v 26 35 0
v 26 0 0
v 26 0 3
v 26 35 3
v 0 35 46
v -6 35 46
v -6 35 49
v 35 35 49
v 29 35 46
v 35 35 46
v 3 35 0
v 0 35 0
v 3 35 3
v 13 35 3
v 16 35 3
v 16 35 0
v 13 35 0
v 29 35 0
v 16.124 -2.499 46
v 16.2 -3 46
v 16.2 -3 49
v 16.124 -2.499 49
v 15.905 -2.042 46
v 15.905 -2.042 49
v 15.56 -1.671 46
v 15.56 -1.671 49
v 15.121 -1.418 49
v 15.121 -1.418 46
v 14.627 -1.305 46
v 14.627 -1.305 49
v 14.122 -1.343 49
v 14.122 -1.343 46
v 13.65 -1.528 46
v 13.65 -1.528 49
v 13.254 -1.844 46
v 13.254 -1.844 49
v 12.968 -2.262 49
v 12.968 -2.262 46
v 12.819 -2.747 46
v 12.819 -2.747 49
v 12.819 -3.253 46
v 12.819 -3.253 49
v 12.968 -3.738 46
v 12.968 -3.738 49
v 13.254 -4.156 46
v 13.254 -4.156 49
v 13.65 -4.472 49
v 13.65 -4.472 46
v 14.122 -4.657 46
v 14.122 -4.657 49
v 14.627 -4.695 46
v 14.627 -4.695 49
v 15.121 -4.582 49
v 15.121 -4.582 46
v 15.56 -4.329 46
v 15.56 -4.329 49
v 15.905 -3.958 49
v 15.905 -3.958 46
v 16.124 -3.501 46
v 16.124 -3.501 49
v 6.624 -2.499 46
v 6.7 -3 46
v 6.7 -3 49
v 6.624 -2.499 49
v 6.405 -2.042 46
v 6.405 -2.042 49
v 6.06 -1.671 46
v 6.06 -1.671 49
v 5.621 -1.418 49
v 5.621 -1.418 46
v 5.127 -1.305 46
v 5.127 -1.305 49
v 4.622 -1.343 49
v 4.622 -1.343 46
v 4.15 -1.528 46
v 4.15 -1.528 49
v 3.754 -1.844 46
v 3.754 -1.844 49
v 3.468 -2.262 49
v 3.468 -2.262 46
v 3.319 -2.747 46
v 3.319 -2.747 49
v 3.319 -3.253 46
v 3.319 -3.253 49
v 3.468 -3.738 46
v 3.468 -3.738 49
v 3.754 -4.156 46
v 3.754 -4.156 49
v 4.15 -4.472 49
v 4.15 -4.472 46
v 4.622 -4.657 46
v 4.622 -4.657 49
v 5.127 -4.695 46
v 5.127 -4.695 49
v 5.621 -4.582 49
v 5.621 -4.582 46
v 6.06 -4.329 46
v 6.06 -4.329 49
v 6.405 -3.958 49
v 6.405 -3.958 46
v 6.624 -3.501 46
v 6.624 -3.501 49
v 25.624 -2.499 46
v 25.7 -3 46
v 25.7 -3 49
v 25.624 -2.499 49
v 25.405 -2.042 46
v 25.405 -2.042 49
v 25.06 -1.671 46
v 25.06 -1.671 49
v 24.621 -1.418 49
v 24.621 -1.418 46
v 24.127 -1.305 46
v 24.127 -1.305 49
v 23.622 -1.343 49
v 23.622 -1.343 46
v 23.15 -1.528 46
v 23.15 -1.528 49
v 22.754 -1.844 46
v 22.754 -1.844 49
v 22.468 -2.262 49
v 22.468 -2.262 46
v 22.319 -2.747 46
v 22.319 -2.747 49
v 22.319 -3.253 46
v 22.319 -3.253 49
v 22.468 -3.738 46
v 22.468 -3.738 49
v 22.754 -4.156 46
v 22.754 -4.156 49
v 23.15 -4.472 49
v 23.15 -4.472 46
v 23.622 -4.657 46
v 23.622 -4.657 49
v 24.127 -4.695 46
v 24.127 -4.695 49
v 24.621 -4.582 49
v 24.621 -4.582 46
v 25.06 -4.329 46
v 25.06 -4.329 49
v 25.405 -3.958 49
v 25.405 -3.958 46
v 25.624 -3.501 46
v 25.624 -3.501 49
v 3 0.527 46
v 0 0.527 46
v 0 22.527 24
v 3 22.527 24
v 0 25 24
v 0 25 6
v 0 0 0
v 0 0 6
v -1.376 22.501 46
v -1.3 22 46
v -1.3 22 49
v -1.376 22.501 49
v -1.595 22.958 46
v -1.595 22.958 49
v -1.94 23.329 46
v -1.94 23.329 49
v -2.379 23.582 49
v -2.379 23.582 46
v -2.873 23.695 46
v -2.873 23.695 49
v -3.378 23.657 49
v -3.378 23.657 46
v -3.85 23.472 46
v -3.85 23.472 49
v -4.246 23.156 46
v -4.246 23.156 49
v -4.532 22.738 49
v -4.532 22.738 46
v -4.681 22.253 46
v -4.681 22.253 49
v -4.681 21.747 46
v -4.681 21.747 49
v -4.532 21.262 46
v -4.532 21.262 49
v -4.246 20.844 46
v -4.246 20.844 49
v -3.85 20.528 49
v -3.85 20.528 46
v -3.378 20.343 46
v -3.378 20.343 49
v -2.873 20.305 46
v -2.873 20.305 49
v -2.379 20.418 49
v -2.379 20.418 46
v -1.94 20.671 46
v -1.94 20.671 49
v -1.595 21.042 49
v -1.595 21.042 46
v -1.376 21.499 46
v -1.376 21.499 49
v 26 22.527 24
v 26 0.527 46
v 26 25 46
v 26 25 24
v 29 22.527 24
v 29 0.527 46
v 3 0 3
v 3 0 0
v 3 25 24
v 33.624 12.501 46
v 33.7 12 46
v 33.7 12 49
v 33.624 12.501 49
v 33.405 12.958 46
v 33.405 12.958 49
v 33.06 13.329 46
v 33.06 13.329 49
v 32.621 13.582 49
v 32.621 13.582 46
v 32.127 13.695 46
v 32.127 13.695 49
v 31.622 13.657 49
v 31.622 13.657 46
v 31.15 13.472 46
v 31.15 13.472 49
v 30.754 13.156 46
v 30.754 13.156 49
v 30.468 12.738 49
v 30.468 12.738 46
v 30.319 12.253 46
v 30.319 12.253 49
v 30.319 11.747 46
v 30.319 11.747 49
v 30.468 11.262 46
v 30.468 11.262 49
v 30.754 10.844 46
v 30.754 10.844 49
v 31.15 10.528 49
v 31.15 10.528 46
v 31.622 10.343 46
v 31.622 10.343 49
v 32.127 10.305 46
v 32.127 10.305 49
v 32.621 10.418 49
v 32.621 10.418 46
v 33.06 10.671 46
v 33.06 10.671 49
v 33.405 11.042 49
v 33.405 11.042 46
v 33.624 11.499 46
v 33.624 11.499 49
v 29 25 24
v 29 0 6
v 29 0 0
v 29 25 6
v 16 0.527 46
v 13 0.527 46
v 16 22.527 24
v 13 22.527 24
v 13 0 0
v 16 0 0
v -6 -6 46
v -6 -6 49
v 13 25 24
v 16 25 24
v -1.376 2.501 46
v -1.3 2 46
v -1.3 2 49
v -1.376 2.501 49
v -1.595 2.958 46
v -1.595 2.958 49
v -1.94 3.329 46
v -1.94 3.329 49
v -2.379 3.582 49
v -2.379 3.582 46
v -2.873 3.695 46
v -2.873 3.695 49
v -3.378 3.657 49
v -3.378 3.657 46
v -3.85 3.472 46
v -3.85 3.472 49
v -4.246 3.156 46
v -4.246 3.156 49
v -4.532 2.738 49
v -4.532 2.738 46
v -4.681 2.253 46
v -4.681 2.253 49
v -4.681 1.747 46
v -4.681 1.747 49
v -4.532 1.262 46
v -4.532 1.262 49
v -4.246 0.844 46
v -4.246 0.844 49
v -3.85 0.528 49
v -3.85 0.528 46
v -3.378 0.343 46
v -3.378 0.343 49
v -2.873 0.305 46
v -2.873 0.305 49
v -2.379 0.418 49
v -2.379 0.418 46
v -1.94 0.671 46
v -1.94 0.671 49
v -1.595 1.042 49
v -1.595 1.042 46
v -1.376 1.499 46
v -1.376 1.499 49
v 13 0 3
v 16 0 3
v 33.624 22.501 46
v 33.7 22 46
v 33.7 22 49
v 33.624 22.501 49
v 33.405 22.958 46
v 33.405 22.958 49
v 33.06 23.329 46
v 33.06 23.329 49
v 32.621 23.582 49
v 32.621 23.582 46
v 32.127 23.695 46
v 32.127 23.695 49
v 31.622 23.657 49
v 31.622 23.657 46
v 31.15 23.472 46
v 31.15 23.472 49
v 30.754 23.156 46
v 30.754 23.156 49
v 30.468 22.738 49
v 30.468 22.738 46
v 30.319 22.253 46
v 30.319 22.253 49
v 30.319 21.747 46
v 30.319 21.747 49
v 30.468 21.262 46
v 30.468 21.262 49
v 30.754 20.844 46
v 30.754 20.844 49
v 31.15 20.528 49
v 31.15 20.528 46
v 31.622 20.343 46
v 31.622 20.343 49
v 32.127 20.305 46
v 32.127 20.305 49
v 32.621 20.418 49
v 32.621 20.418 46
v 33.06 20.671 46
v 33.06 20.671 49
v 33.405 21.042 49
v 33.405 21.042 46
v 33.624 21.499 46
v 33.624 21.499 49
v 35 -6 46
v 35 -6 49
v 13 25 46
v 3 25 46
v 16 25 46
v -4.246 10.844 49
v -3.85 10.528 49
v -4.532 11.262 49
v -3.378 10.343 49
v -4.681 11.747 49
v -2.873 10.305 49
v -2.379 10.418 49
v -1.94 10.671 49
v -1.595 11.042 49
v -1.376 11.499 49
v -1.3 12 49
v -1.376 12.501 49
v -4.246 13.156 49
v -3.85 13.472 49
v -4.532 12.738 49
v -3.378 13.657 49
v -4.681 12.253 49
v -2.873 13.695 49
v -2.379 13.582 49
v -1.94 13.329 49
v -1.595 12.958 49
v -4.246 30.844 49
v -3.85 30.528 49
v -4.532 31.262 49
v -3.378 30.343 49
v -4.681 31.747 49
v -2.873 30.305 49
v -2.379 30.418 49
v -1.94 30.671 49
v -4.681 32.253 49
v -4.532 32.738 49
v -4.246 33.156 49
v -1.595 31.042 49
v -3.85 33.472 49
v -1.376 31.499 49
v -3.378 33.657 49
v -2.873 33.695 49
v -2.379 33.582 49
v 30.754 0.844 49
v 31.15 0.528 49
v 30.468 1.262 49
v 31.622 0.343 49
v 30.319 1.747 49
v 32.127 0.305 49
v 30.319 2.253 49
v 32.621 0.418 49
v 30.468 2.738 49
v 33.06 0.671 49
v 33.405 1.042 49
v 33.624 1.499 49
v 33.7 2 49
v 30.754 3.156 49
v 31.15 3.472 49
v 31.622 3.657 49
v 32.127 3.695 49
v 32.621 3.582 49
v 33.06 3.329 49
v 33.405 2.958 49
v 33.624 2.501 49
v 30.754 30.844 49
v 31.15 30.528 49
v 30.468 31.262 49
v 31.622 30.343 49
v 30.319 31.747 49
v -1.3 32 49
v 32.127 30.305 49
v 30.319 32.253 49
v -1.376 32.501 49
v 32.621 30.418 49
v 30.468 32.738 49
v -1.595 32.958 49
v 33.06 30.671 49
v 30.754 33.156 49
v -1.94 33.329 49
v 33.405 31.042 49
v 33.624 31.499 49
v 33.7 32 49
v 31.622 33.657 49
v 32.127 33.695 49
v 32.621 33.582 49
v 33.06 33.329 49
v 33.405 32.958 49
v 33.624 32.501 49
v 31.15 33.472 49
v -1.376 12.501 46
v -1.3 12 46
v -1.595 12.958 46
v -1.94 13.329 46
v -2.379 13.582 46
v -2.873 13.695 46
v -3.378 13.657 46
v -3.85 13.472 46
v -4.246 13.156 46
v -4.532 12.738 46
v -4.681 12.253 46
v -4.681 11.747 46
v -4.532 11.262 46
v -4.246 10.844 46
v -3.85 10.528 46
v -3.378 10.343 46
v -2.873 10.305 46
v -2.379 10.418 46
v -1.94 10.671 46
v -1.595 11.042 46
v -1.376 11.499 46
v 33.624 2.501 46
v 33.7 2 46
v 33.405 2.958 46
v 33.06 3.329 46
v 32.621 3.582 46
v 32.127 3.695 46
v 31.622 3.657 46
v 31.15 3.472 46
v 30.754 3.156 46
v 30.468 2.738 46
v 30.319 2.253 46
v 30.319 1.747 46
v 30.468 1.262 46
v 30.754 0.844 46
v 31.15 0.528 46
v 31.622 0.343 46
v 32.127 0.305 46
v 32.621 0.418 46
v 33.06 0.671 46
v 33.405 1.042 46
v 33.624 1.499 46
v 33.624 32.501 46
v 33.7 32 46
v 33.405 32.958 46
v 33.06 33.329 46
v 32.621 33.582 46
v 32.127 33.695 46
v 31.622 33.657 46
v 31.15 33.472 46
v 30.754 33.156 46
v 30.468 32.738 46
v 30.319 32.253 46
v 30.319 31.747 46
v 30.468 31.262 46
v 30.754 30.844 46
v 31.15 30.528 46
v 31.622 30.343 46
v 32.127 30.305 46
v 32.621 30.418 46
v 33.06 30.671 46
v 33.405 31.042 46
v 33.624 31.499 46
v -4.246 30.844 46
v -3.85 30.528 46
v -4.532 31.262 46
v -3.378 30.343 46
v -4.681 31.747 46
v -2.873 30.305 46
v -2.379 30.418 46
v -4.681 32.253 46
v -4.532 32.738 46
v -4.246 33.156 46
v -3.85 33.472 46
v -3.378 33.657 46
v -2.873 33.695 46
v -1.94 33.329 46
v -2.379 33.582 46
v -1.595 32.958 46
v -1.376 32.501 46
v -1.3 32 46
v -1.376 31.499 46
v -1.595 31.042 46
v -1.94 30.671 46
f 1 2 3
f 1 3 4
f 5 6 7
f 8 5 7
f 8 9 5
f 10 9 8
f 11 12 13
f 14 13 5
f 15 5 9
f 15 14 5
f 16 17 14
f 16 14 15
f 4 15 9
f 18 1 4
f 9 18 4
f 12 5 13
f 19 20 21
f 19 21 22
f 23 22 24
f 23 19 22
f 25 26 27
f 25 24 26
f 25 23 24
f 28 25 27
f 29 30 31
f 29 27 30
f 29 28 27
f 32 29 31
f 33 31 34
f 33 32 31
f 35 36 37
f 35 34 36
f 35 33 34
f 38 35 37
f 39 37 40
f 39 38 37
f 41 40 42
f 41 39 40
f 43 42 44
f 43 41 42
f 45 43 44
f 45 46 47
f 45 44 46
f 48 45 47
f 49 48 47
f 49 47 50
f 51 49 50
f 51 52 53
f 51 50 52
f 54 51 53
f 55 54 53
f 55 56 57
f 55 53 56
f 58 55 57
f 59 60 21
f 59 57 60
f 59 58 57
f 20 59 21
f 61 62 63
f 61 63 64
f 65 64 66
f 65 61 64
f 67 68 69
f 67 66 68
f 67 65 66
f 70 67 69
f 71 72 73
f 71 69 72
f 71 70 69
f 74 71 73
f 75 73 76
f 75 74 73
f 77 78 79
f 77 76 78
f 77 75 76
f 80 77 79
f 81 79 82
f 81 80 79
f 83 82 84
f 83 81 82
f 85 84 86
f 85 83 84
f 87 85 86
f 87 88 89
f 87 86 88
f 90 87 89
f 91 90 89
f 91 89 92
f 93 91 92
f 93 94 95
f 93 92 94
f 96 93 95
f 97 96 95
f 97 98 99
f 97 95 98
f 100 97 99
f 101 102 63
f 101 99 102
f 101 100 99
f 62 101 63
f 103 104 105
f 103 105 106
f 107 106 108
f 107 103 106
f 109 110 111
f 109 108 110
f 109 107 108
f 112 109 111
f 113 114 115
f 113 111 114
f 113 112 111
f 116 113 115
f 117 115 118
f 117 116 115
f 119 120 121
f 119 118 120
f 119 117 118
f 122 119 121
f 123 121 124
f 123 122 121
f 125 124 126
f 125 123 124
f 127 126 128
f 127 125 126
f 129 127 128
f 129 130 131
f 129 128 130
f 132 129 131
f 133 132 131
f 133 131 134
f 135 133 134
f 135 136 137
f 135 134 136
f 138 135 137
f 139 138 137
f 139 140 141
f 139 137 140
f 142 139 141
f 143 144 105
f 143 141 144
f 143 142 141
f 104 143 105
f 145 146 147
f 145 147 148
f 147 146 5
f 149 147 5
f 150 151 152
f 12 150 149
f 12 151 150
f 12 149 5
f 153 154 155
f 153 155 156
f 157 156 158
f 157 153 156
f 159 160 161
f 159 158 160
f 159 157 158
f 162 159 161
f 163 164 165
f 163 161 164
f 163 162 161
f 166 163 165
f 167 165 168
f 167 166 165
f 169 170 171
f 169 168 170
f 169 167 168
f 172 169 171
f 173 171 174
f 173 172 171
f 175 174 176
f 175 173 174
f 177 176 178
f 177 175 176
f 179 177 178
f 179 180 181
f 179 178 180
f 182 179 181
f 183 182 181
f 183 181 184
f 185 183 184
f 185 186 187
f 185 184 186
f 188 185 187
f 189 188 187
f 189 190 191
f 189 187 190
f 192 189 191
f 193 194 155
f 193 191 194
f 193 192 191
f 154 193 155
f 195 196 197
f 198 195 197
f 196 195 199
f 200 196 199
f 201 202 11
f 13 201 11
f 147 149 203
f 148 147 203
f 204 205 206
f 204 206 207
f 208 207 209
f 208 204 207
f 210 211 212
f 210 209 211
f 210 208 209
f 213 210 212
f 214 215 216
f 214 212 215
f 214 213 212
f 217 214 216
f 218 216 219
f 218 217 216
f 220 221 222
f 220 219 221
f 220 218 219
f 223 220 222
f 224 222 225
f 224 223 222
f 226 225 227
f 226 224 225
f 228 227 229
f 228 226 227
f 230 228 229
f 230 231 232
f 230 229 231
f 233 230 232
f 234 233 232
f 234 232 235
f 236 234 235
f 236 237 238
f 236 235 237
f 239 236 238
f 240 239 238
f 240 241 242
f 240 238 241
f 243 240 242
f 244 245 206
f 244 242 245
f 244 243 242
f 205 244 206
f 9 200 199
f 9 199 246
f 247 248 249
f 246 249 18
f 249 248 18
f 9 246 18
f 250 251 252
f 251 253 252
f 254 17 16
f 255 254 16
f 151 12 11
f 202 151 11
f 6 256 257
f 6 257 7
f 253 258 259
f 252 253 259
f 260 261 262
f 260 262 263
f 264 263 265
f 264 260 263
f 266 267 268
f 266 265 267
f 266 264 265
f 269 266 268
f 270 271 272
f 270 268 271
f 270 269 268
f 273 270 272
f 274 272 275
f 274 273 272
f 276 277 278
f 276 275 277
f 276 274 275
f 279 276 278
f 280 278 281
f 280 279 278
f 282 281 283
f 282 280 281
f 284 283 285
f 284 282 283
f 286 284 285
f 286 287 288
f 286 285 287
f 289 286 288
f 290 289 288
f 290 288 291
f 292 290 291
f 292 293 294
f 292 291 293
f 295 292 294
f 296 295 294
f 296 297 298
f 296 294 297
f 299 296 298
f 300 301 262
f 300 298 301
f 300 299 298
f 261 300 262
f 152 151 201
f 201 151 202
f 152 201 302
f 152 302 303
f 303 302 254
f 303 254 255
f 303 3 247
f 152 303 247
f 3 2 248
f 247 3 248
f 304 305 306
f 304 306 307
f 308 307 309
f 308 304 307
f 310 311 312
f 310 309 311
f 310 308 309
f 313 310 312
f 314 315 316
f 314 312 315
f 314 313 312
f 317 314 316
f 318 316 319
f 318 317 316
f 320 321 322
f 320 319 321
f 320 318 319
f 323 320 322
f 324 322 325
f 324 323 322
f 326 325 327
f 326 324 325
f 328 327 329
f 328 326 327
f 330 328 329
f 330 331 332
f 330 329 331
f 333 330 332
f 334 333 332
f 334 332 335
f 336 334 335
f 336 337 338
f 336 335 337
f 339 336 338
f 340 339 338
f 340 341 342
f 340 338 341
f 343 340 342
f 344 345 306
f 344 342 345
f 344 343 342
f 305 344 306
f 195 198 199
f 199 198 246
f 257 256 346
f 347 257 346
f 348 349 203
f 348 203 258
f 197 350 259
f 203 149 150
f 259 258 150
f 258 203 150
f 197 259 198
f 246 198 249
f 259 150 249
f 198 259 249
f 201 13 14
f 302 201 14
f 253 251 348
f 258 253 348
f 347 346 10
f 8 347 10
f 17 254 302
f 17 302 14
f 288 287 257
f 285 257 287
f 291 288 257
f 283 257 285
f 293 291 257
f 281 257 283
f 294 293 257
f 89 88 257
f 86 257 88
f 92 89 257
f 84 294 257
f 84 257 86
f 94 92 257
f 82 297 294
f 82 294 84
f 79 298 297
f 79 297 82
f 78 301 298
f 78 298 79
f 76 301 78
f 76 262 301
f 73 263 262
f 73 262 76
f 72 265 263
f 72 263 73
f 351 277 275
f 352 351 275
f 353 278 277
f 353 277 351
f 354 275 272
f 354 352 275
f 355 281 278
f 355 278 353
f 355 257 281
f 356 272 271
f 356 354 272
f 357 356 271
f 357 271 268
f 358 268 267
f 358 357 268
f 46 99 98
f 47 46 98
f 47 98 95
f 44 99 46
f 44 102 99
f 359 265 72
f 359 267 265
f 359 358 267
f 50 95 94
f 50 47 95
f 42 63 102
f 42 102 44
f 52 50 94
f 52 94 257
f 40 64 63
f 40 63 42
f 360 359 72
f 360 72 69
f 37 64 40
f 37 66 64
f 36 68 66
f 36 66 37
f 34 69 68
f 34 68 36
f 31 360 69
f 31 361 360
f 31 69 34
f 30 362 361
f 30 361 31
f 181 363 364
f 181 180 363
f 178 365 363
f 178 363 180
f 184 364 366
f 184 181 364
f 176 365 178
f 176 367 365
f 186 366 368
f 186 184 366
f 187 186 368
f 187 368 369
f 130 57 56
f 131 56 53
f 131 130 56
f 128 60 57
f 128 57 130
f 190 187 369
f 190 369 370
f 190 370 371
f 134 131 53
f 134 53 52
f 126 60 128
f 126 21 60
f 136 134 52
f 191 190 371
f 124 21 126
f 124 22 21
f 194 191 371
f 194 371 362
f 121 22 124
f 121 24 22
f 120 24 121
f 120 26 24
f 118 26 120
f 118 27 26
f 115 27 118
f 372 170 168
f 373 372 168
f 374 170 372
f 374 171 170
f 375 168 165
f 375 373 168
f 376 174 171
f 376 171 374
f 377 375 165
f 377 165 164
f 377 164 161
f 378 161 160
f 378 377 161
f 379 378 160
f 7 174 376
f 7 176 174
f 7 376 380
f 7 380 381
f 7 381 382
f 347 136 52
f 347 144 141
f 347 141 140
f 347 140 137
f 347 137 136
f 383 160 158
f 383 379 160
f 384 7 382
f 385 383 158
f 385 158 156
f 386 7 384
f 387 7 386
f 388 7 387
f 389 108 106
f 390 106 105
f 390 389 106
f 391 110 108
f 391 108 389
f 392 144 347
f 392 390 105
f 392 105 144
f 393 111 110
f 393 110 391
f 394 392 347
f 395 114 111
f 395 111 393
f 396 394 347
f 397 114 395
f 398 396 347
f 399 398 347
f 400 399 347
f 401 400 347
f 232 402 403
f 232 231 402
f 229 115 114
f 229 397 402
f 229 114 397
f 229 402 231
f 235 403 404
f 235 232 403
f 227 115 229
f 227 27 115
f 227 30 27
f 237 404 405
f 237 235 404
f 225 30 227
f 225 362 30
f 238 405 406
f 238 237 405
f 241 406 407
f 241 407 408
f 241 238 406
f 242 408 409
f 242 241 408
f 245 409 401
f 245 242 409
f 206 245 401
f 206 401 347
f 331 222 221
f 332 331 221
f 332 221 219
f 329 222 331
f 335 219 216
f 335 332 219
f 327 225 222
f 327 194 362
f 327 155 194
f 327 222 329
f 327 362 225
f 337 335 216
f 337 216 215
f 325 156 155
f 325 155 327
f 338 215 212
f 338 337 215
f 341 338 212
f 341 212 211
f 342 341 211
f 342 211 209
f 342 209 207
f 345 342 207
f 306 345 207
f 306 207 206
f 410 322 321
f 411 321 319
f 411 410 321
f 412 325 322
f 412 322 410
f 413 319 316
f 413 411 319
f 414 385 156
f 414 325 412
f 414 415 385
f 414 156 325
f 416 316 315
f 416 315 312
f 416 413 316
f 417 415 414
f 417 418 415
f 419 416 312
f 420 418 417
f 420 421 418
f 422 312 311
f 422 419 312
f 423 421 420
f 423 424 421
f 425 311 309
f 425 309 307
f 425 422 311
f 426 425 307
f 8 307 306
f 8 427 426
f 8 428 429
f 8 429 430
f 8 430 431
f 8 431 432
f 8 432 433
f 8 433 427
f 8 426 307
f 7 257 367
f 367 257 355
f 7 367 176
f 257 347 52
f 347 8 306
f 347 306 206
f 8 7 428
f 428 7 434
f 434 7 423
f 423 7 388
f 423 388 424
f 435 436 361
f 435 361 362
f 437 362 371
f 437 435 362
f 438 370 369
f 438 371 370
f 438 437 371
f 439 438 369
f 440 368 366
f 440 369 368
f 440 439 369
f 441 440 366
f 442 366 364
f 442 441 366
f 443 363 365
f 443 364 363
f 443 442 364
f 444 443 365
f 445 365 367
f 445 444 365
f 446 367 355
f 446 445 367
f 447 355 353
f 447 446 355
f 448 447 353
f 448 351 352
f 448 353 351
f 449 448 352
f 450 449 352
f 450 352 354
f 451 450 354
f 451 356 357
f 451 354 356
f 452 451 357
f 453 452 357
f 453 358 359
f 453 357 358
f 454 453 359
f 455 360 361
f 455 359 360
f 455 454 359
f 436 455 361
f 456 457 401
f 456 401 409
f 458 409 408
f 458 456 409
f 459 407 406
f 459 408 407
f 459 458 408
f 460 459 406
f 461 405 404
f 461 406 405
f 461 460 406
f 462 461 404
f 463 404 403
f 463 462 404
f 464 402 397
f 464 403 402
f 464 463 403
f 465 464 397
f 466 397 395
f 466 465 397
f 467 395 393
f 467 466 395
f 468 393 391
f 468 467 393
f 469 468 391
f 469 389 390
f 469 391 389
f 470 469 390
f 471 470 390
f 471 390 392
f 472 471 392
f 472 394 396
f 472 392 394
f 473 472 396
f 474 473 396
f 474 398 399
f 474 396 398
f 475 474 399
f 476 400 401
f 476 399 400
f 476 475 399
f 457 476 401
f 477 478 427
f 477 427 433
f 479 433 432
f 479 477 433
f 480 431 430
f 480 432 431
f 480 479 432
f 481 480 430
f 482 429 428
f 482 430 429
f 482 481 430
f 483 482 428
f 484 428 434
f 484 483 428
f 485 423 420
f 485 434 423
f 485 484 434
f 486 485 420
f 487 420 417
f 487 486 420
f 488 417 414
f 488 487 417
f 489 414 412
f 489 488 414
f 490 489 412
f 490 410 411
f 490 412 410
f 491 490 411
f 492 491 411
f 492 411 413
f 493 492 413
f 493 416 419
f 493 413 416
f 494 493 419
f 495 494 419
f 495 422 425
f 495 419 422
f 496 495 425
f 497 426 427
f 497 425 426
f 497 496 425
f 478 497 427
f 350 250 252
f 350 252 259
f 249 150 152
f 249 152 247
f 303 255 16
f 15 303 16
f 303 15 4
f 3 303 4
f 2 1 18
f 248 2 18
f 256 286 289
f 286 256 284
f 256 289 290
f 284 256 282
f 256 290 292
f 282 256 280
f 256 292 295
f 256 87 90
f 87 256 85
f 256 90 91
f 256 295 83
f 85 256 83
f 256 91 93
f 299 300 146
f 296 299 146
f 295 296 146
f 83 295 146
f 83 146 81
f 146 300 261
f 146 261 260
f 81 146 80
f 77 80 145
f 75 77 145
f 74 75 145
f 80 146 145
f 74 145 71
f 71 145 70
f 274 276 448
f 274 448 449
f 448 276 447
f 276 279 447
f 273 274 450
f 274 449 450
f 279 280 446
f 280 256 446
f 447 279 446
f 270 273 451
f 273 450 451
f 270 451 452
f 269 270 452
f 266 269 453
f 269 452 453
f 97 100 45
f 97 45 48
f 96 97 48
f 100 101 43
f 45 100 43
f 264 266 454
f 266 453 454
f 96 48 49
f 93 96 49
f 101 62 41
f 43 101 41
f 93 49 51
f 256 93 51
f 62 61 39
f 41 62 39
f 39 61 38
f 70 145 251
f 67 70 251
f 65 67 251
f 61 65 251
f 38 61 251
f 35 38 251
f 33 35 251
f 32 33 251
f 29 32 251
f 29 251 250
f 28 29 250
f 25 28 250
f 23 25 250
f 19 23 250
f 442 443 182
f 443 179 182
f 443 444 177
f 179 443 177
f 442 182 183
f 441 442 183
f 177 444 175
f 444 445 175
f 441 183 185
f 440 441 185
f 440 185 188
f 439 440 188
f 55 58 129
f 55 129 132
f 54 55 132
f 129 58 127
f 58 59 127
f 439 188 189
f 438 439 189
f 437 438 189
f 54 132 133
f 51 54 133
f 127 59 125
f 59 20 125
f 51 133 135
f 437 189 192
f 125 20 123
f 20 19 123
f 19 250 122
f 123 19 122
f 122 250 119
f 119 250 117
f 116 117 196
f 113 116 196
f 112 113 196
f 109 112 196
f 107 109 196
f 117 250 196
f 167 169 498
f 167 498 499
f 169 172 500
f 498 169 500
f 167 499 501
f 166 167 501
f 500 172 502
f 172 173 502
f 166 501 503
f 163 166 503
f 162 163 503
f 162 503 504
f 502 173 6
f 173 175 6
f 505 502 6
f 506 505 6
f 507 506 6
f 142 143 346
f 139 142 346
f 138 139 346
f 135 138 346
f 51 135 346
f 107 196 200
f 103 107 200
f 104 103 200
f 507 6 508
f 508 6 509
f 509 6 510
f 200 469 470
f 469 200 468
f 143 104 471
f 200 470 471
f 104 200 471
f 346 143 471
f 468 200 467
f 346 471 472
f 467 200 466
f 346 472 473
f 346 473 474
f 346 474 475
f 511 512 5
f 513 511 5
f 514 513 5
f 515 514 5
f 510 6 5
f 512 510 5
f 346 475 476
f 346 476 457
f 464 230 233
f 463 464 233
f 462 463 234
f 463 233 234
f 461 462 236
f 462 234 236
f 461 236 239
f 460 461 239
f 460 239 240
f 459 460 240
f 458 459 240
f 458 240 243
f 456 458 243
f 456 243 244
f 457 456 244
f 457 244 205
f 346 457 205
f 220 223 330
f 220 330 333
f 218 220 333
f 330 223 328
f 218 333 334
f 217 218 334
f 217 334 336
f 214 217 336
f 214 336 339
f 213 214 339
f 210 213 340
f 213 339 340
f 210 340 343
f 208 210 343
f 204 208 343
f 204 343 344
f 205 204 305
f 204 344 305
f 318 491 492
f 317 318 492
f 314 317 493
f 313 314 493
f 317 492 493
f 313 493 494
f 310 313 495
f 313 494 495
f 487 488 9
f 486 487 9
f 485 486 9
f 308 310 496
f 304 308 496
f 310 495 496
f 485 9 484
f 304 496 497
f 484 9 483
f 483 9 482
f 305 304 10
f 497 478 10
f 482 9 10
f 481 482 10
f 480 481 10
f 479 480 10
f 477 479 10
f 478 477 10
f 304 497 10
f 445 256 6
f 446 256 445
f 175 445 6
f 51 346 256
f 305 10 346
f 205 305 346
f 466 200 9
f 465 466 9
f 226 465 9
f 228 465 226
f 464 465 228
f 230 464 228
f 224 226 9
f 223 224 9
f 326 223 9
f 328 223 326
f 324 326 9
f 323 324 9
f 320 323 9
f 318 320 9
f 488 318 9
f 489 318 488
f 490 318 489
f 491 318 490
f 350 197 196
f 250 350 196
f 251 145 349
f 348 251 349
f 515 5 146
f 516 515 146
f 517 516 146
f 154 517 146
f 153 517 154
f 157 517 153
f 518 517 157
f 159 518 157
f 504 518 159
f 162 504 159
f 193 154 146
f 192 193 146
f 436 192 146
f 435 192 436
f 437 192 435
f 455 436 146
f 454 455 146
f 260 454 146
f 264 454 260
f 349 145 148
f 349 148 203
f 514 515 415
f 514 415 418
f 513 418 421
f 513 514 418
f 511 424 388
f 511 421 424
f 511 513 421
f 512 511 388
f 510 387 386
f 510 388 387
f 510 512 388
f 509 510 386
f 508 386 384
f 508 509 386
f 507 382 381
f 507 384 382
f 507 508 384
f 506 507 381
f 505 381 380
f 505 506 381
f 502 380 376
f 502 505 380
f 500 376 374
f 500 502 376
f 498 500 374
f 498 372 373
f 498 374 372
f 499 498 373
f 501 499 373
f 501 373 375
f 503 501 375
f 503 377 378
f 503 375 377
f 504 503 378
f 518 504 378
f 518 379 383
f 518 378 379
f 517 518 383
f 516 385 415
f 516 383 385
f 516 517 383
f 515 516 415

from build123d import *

# Parameters (mm, degrees)
CYLINDER010_R     = 1.7
CYLINDER010_DEPTH = 10
CYLINDER009_R     = 1.7
CYLINDER009_DEPTH = 10
CYLINDER008_R     = 1.7
CYLINDER008_DEPTH = 10
CYLINDER007_R     = 1.7
CYLINDER007_DEPTH = 10
CYLINDER006_R     = 1.7
CYLINDER006_DEPTH = 10
CYLINDER005_R     = 1.7
CYLINDER005_DEPTH = 10
CYLINDER004_R     = 1.7
CYLINDER004_DEPTH = 10
CYLINDER003_R     = 1.7
CYLINDER003_DEPTH = 10
CYLINDER002_R     = 1.7
CYLINDER002_DEPTH = 10
CYLINDER001_R     = 1.7
CYLINDER001_DEPTH = 10
CYLINDER_R        = 1.7
CYLINDER_DEPTH    = 10
BOX007_W          = 41
BOX007_H          = 41
BOX007_DEPTH      = 3
BOX006_W          = 10
BOX006_H          = 25
BOX006_DEPTH      = 22
BOX005_W          = 10
BOX005_H          = 25
BOX005_DEPTH      = 22
BOX004_W          = 29
BOX004_H          = 23
BOX004_DEPTH      = 34
BOX004_ROLL_ANGLE = 45
BOX001_W          = 29
BOX001_H          = 25
BOX001_DEPTH      = 18
BOX003_W          = 10
BOX003_H          = 40
BOX003_DEPTH      = 3
BOX002_W          = 10
BOX002_H          = 40
BOX002_DEPTH      = 3
BOX_W             = 29
BOX_H             = 35
BOX_DEPTH         = 49


with BuildPart() as cylinder010:
    # Cylinder010 → Cylinder010 (new body)
    with BuildSketch(Plane(origin=(32, 2, 41), x_dir=(1, 0, 0), z_dir=(0, 0, 1))):
        Circle(CYLINDER010_R)
    extrude(amount=CYLINDER010_DEPTH)


with BuildPart() as cylinder009:
    # Cylinder009 → Cylinder009 (new body)
    with BuildSketch(Plane(origin=(32, 12, 41), x_dir=(1, 0, 0), z_dir=(0, 0, 1))):
        Circle(CYLINDER009_R)
    extrude(amount=CYLINDER009_DEPTH)


with BuildPart() as cylinder008:
    # Cylinder008 → Cylinder008 (new body)
    with BuildSketch(Plane(origin=(32, 22, 41), x_dir=(1, 0, 0), z_dir=(0, 0, 1))):
        Circle(CYLINDER008_R)
    extrude(amount=CYLINDER008_DEPTH)


with BuildPart() as cylinder007:
    # Cylinder007 → Cylinder007 (new body)
    with BuildSketch(Plane(origin=(32, 32, 41), x_dir=(1, 0, 0), z_dir=(0, 0, 1))):
        Circle(CYLINDER007_R)
    extrude(amount=CYLINDER007_DEPTH)


with BuildPart() as cylinder006:
    # Cylinder006 → Cylinder006 (new body)
    with BuildSketch(Plane(origin=(-3, 2, 41), x_dir=(1, 0, 0), z_dir=(0, 0, 1))):
        Circle(CYLINDER006_R)
    extrude(amount=CYLINDER006_DEPTH)


with BuildPart() as cylinder005:
    # Cylinder005 → Cylinder005 (new body)
    with BuildSketch(Plane(origin=(-3, 12, 41), x_dir=(1, 0, 0), z_dir=(0, 0, 1))):
        Circle(CYLINDER005_R)
    extrude(amount=CYLINDER005_DEPTH)


with BuildPart() as cylinder004:
    # Cylinder004 → Cylinder004 (new body)
    with BuildSketch(Plane(origin=(-3, 22, 41), x_dir=(1, 0, 0), z_dir=(0, 0, 1))):
        Circle(CYLINDER004_R)
    extrude(amount=CYLINDER004_DEPTH)


with BuildPart() as cylinder003:
    # Cylinder003 → Cylinder003 (new body)
    with BuildSketch(Plane(origin=(-3, 32, 41), x_dir=(1, 0, 0), z_dir=(0, 0, 1))):
        Circle(CYLINDER003_R)
    extrude(amount=CYLINDER003_DEPTH)


with BuildPart() as cylinder002:
    # Cylinder002 → Cylinder002 (new body)
    with BuildSketch(Plane(origin=(24, -3, 41), x_dir=(1, 0, 0), z_dir=(0, 0, 1))):
        Circle(CYLINDER002_R)
    extrude(amount=CYLINDER002_DEPTH)


with BuildPart() as cylinder001:
    # Cylinder001 → Cylinder001 (new body)
    with BuildSketch(Plane(origin=(5, -3, 41), x_dir=(1, 0, 0), z_dir=(0, 0, 1))):
        Circle(CYLINDER001_R)
    extrude(amount=CYLINDER001_DEPTH)


with BuildPart() as cylinder:
    # Cylinder → Cylinder (new body)
    with BuildSketch(Plane(origin=(14.5, -3, 41), x_dir=(1, 0, 0), z_dir=(0, 0, 1))):
        Circle(CYLINDER_R)
    extrude(amount=CYLINDER_DEPTH)


with BuildPart() as cut016:
    # Box007 → Box007 (new body)
    with BuildSketch(Plane(origin=(-6, -6, 46), x_dir=(1, 0, 0), z_dir=(0, 0, 1))):
        with Locations((20.5, 20.5)):
            Rectangle(BOX007_W, BOX007_H)
    extrude(amount=BOX007_DEPTH)

    # Cut006: cut Cylinder
    add(cylinder.part, mode=Mode.SUBTRACT)

    # Cut007: cut Cylinder001
    add(cylinder001.part, mode=Mode.SUBTRACT)

    # Cut008: cut Cylinder002
    add(cylinder002.part, mode=Mode.SUBTRACT)

    # Cut009: cut Cylinder003
    add(cylinder003.part, mode=Mode.SUBTRACT)

    # Cut010: cut Cylinder004
    add(cylinder004.part, mode=Mode.SUBTRACT)

    # Cut011: cut Cylinder005
    add(cylinder005.part, mode=Mode.SUBTRACT)

    # Cut012: cut Cylinder006
    add(cylinder006.part, mode=Mode.SUBTRACT)

    # Cut013: cut Cylinder007
    add(cylinder007.part, mode=Mode.SUBTRACT)

    # Cut014: cut Cylinder008
    add(cylinder008.part, mode=Mode.SUBTRACT)

    # Cut015: cut Cylinder009
    add(cylinder009.part, mode=Mode.SUBTRACT)

    # Cut016: cut Cylinder010
    add(cylinder010.part, mode=Mode.SUBTRACT)


with BuildPart() as cube006:
    # Box006 → Box006 (new body)
    with BuildSketch(Plane(origin=(16, 0, 24), x_dir=(1, 0, 0), z_dir=(0, 0, 1))):
        with Locations((5, 12.5)):
            Rectangle(BOX006_W, BOX006_H)
    extrude(amount=BOX006_DEPTH)


with BuildPart() as cube005:
    # Box005 → Box005 (new body)
    with BuildSketch(Plane(origin=(3, 0, 24), x_dir=(1, 0, 0), z_dir=(0, 0, 1))):
        with Locations((5, 12.5)):
            Rectangle(BOX005_W, BOX005_H)
    extrude(amount=BOX005_DEPTH)


with BuildPart() as cube004:
    # Box004 → Box004 (new body)
    with BuildSketch(Plane.XY):
        with Locations((14.5, 11.5)):
            Rectangle(BOX004_W, BOX004_H)
    extrude(amount=BOX004_DEPTH)


with BuildPart() as cube004_1:
    # Box004 roll: moved
    add(cube004.part.rotate(Axis((0, 0, 0), (1, 0, 0)), BOX004_ROLL_ANGLE))


with BuildPart() as cube004_2:
    # Box004 placement: moved
    add(cube004_1.part.moved(Location((0, 7, 7))))


with BuildPart() as cube001:
    # Box001 → Box001 (new body)
    with BuildSketch(Plane.XY.offset(6)):
        with Locations((14.5, 12.5)):
            Rectangle(BOX001_W, BOX001_H)
    extrude(amount=BOX001_DEPTH)


with BuildPart() as cube003:
    # Box003 → Box003 (new body)
    with BuildSketch(Plane(origin=(16, 0, 0), x_dir=(1, 0, 0), z_dir=(0, 0, 1))):
        with Locations((5, 20)):
            Rectangle(BOX003_W, BOX003_H)
    extrude(amount=BOX003_DEPTH)


with BuildPart() as cube002:
    # Box002 → Box002 (new body)
    with BuildSketch(Plane(origin=(3, 0, 0), x_dir=(1, 0, 0), z_dir=(0, 0, 1))):
        with Locations((5, 20)):
            Rectangle(BOX002_W, BOX002_H)
    extrude(amount=BOX002_DEPTH)


with BuildPart() as fusion:
    # Box → Box (new body)
    with BuildSketch(Plane.XY):
        with Locations((14.5, 17.5)):
            Rectangle(BOX_W, BOX_H)
    extrude(amount=BOX_DEPTH)

    # Cut: cut Cube002
    add(cube002.part, mode=Mode.SUBTRACT)

    # Cut001: cut Cube003
    add(cube003.part, mode=Mode.SUBTRACT)

    # Cut002: cut Cube001
    add(cube001.part, mode=Mode.SUBTRACT)

    # Cut003: cut Cube004
    add(cube004_2.part, mode=Mode.SUBTRACT)

    # Cut004: cut Cube005
    add(cube005.part, mode=Mode.SUBTRACT)

    # Cut005: cut Cube006
    add(cube006.part, mode=Mode.SUBTRACT)

    # Fusion: union Cut016
    add(cut016.part)


solid = fusion.part
